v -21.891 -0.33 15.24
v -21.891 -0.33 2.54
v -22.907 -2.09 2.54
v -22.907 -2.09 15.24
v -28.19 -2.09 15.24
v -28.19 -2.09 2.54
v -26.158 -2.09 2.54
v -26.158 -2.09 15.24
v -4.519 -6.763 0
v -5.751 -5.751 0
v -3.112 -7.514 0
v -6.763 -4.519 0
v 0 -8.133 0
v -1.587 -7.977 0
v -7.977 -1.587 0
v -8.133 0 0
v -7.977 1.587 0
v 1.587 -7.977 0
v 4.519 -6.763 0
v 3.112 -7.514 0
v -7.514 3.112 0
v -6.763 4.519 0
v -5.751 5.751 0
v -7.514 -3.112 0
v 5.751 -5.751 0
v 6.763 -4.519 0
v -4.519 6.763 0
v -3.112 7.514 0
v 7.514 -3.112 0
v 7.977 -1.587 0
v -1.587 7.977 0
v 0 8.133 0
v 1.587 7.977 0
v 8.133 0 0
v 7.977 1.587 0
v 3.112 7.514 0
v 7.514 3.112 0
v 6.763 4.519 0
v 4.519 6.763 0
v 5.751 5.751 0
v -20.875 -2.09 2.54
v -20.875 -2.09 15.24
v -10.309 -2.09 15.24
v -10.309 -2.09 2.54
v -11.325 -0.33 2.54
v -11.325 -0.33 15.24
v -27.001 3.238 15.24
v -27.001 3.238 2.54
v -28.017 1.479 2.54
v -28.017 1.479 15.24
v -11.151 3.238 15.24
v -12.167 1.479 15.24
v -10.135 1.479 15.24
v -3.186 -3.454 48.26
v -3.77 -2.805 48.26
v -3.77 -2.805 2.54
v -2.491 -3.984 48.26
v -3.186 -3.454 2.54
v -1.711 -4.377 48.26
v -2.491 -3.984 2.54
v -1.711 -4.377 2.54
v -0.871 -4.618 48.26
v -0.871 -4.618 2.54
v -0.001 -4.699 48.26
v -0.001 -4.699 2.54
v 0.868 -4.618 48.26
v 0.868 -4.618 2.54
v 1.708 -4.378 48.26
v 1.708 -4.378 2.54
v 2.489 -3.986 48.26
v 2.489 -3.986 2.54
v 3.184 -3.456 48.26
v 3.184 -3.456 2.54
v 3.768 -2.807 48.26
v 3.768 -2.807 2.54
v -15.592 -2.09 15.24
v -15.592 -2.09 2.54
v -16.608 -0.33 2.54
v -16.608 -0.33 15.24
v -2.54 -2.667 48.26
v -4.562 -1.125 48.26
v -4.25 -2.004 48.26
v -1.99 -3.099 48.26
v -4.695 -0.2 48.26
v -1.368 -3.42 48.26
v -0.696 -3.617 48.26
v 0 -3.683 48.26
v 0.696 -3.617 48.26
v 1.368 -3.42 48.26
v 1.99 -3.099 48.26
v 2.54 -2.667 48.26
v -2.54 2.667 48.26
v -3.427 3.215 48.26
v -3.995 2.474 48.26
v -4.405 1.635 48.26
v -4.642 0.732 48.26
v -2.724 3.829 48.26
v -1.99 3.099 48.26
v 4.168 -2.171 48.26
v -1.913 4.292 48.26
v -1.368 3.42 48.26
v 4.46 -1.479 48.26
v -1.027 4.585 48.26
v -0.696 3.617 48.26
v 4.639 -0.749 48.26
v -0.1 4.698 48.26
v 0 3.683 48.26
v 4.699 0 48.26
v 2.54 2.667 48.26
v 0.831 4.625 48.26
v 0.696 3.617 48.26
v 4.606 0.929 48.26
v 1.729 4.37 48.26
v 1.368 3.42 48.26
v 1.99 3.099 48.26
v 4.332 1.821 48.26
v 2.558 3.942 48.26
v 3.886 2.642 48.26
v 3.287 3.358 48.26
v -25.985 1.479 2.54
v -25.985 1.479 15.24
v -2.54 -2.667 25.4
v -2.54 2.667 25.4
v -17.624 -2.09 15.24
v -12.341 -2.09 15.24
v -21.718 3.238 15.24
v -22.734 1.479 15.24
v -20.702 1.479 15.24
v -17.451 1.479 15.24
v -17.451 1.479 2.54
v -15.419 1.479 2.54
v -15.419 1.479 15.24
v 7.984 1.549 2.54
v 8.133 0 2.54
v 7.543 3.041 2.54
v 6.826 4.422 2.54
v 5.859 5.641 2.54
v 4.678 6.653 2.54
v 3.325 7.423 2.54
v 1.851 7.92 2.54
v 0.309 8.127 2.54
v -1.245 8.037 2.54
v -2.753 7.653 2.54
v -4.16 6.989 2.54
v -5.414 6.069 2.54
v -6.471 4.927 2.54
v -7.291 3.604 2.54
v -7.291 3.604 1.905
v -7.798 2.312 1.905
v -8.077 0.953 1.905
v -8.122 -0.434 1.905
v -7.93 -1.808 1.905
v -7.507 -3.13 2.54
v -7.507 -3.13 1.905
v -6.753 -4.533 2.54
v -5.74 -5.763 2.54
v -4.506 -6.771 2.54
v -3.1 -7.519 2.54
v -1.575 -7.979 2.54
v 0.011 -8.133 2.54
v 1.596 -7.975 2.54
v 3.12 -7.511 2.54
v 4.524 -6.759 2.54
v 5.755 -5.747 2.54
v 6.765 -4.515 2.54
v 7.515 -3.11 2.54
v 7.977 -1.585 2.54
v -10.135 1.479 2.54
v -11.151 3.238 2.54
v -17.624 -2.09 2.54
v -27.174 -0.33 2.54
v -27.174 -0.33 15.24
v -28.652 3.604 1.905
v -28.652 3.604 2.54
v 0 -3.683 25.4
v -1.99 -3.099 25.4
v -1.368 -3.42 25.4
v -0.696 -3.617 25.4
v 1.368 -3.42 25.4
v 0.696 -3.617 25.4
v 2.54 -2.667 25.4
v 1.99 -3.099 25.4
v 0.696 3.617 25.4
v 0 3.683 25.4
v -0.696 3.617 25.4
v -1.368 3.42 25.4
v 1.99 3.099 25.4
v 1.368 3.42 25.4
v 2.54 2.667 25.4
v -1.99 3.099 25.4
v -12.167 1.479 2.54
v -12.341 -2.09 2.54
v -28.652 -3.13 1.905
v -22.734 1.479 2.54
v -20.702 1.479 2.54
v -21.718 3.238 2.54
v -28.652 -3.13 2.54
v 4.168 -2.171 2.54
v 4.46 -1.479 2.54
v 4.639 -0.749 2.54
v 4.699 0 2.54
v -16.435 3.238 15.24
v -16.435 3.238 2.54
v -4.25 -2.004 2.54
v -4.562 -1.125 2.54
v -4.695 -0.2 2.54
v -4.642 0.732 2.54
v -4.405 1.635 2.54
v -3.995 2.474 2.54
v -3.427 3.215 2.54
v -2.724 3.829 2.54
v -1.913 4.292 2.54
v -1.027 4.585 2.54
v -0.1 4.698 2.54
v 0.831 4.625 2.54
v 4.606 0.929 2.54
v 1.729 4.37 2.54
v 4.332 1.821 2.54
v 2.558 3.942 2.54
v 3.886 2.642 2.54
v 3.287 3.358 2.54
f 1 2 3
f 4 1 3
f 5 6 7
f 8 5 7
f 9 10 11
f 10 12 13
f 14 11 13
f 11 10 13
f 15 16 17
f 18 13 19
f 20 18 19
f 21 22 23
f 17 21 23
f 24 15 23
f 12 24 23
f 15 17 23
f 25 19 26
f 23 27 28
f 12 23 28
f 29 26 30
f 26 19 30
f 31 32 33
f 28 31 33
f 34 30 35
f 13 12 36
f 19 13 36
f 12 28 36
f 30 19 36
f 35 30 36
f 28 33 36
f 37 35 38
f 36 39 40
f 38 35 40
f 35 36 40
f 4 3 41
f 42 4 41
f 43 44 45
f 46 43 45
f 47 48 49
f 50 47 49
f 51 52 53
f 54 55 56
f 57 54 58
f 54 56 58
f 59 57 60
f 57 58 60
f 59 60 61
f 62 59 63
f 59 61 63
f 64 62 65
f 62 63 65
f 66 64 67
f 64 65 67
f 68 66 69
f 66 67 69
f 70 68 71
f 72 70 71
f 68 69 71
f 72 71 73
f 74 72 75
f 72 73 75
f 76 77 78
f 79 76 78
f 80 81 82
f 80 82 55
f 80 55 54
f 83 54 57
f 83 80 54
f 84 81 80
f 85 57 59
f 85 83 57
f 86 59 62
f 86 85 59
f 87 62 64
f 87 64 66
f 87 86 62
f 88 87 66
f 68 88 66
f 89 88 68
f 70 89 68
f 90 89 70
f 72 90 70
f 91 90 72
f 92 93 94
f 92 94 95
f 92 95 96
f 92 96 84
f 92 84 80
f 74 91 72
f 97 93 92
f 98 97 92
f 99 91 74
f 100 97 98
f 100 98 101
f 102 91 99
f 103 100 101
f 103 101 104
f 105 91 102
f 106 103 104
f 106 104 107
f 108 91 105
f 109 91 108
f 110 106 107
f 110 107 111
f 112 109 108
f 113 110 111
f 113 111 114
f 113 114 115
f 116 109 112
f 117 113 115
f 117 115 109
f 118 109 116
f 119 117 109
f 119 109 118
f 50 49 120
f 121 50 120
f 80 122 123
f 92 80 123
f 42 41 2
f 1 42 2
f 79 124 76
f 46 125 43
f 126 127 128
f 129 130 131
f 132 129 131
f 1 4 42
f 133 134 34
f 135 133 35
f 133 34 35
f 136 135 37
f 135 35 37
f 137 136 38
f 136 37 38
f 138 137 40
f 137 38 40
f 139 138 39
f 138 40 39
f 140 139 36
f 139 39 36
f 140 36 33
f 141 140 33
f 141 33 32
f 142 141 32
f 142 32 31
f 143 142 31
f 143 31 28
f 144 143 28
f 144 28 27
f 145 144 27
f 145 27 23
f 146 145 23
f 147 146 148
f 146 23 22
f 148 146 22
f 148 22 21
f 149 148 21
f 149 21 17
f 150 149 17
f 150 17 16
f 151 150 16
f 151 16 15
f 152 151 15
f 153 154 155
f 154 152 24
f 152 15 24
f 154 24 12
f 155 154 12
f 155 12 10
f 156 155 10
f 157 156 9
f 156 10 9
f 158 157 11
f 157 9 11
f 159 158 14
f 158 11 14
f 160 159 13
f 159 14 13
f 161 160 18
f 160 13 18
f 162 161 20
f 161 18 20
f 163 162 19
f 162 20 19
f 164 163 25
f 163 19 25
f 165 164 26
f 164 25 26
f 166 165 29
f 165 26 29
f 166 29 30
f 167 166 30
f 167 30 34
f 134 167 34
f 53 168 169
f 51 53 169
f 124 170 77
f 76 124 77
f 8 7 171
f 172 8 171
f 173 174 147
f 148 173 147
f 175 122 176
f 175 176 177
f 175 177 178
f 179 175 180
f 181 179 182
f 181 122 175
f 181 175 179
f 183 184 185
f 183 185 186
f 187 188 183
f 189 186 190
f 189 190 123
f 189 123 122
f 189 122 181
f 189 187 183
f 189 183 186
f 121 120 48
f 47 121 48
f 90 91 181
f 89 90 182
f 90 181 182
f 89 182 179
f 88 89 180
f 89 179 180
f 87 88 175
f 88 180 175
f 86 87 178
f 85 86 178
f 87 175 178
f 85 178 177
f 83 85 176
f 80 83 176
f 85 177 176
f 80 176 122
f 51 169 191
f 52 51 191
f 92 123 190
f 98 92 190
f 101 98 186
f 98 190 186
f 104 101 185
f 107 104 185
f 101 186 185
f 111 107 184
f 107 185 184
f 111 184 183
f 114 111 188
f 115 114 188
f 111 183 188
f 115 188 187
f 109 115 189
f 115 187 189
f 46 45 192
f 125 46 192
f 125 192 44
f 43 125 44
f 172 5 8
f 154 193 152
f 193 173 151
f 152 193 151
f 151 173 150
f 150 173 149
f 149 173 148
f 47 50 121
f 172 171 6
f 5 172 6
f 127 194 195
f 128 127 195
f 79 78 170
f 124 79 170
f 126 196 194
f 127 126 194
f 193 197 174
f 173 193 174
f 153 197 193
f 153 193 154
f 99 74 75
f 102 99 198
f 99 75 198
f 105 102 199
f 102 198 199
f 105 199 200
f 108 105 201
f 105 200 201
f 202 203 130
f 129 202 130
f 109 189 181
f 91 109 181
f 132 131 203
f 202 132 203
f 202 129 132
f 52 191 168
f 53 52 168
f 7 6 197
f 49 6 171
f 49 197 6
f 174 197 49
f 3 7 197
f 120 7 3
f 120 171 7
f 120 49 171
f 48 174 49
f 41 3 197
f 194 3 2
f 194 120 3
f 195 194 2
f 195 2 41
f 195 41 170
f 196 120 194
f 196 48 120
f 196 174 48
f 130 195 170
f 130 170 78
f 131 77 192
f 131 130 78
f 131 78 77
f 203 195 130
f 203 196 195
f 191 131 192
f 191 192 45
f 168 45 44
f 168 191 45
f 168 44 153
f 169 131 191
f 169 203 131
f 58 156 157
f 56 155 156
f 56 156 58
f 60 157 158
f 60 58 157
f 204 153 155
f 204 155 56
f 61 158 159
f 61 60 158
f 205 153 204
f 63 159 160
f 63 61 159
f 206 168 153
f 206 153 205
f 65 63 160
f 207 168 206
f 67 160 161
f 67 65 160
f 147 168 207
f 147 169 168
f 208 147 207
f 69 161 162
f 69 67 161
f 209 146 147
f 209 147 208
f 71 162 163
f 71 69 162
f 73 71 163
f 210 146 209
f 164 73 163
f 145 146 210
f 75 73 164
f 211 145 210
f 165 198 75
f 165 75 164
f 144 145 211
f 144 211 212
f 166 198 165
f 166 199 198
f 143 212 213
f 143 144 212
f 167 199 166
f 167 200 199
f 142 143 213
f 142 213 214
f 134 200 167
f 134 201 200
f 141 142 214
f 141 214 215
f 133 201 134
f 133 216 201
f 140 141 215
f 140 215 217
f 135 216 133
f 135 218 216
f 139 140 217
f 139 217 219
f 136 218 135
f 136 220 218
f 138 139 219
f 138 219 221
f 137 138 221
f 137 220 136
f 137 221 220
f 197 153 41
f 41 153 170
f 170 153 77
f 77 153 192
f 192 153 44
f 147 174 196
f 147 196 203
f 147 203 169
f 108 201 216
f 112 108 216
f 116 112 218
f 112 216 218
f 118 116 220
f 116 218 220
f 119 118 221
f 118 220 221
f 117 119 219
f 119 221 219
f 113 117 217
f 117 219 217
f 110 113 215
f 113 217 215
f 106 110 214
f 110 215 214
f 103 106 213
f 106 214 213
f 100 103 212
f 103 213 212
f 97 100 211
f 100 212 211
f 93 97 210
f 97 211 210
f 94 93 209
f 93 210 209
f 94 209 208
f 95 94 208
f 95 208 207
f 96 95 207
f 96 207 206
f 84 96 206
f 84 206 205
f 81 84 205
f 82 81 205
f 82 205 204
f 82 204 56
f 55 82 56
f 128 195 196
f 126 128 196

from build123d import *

# Parameters (mm, degrees)
F1_DEPTH = 48.26
F2_DEPTH = 25.4
F3_R     = 8.133276
F4_DEPTH = 2.54
F5_W     = 25.4
F5_H     = 6.734311
F6_DEPTH = 0.635
F8_DEPTH = 12.7


with BuildPart() as f1:
    # F0 (on Top) → F1 (new body)
    with BuildSketch(Plane.XY):
        with BuildLine():
            Line((-2.54, -2.805053), (-3.769917, -2.805053))
            ThreePointArc((-3.769917, -2.805053), (-0.00142, -4.699), (3.768222, -2.807331))
            Line((3.768222, -2.807331), (2.54, -2.807331))
            Line((2.54, -2.807331), (2.54, -2.667))
            ThreePointArc((2.54, -2.667), (0, -3.683), (-2.54, -2.667))
            Line((-2.54, -2.667), (-2.54, -2.805053))
        make_face()
        with BuildLine():
            Line((2.54, 0), (2.54, -2.667))
            ThreePointArc((2.54, -2.667), (3.385211, -1.450805), (3.683, 0))
            ThreePointArc((3.683, 0), (3.385211, 1.450805), (2.54, 2.667))
            Line((2.54, 2.667), (2.54, 0))
        make_face()
        with BuildLine():
            Line((2.54, -2.807331), (3.768222, -2.807331))
            Line((3.768222, -2.807331), (3.768222, 2.667))
            Line((3.768222, 2.667), (2.54, 2.667))
            ThreePointArc((2.54, 2.667), (3.385211, 1.450805), (3.683, 0))
            ThreePointArc((3.683, 0), (3.385211, -1.450805), (2.54, -2.667))
            Line((2.54, -2.667), (2.54, -2.807331))
        make_face()
        with BuildLine():
            ThreePointArc((3.768222, -2.807331), (4.46024, -1.478805), (4.699, 0))
            ThreePointArc((4.699, 0), (-1.477457, 4.460686), (-3.769917, -2.805053))
            Line((-3.769917, -2.805053), (-3.769917, 2.667))
            Line((-3.769917, 2.667), (-2.54, 2.667))
            ThreePointArc((-2.54, 2.667), (0, 3.683), (2.54, 2.667))
            Line((2.54, 2.667), (3.768222, 2.667))
            Line((3.768222, 2.667), (3.768222, -2.807331))
        make_face()
        with BuildLine():
            Line((-3.769917, 2.667), (-3.769917, -2.805053))
            Line((-3.769917, -2.805053), (-2.54, -2.805053))
            Line((-2.54, -2.805053), (-2.54, -2.667))
            ThreePointArc((-2.54, -2.667), (-3.683, 0), (-2.54, 2.667))
            Line((-2.54, 2.667), (-3.769917, 2.667))
        make_face()
        with BuildLine():
            ThreePointArc((-2.54, 2.667), (-3.683, 0), (-2.54, -2.667))
            Line((-2.54, -2.667), (-2.54, 0))
            Line((-2.54, 0), (-2.54, 2.667))
        make_face()
    extrude(amount=F1_DEPTH)

    # F0 (on Top) → F2 (join)
    with BuildSketch(Plane.XY):
        with BuildLine():
            Line((-2.54, 0), (-2.54, -2.667))
            ThreePointArc((-2.54, -2.667), (0, -3.683), (2.54, -2.667))
            Line((2.54, -2.667), (2.54, 0))
            Line((2.54, 0), (0, 0))
            Line((0, 0), (-2.54, 0))
        make_face()
        with BuildLine():
            ThreePointArc((2.54, 2.667), (0, 3.683), (-2.54, 2.667))
            Line((-2.54, 2.667), (-2.54, 0))
            Line((-2.54, 0), (0, 0))
            Line((0, 0), (2.54, 0))
            Line((2.54, 0), (2.54, 2.667))
        make_face()
    extrude(amount=F2_DEPTH)

    # F3 (on Top) → F4 (join)
    with BuildSketch(Plane.XY):
        Circle(F3_R)
    extrude(amount=F4_DEPTH)

    # F5 (on face) → F6 (join)
    with BuildSketch(Plane.XY.offset(2.54)):
        with Locations((-15.95207, 0.237246)):
            Rectangle(F5_W, F5_H)
    extrude(amount=-F6_DEPTH)

    # F7 (on face) → F8 (join)
    with BuildSketch(Plane.XY.offset(2.54)):
        Polygon((-27.00107, 3.238266), (-28.01707, 1.478502), (-25.98507, 1.478502), align=None)
        Polygon((-22.73387, 1.478502), (-20.70187, 1.478502), (-21.71787, 3.238266), align=None)
        Polygon((-17.45067, 1.478502), (-15.41867, 1.478502), (-16.43467, 3.238266), align=None)
        Polygon((-12.16747, 1.478502), (-10.13547, 1.478502), (-11.15147, 3.238266), align=None)
        Polygon((-27.174182, -0.329896), (-28.190182, -2.089659), (-26.158182, -2.089659), align=None)
        Polygon((-22.906982, -2.089659), (-20.874982, -2.089659), (-21.890982, -0.329896), align=None)
        Polygon((-17.623782, -2.089659), (-15.591782, -2.089659), (-16.607782, -0.329896), align=None)
        Polygon((-12.340582, -2.089659), (-10.308582, -2.089659), (-11.324582, -0.329896), align=None)
    extrude(amount=F8_DEPTH)


solid = f1.part
